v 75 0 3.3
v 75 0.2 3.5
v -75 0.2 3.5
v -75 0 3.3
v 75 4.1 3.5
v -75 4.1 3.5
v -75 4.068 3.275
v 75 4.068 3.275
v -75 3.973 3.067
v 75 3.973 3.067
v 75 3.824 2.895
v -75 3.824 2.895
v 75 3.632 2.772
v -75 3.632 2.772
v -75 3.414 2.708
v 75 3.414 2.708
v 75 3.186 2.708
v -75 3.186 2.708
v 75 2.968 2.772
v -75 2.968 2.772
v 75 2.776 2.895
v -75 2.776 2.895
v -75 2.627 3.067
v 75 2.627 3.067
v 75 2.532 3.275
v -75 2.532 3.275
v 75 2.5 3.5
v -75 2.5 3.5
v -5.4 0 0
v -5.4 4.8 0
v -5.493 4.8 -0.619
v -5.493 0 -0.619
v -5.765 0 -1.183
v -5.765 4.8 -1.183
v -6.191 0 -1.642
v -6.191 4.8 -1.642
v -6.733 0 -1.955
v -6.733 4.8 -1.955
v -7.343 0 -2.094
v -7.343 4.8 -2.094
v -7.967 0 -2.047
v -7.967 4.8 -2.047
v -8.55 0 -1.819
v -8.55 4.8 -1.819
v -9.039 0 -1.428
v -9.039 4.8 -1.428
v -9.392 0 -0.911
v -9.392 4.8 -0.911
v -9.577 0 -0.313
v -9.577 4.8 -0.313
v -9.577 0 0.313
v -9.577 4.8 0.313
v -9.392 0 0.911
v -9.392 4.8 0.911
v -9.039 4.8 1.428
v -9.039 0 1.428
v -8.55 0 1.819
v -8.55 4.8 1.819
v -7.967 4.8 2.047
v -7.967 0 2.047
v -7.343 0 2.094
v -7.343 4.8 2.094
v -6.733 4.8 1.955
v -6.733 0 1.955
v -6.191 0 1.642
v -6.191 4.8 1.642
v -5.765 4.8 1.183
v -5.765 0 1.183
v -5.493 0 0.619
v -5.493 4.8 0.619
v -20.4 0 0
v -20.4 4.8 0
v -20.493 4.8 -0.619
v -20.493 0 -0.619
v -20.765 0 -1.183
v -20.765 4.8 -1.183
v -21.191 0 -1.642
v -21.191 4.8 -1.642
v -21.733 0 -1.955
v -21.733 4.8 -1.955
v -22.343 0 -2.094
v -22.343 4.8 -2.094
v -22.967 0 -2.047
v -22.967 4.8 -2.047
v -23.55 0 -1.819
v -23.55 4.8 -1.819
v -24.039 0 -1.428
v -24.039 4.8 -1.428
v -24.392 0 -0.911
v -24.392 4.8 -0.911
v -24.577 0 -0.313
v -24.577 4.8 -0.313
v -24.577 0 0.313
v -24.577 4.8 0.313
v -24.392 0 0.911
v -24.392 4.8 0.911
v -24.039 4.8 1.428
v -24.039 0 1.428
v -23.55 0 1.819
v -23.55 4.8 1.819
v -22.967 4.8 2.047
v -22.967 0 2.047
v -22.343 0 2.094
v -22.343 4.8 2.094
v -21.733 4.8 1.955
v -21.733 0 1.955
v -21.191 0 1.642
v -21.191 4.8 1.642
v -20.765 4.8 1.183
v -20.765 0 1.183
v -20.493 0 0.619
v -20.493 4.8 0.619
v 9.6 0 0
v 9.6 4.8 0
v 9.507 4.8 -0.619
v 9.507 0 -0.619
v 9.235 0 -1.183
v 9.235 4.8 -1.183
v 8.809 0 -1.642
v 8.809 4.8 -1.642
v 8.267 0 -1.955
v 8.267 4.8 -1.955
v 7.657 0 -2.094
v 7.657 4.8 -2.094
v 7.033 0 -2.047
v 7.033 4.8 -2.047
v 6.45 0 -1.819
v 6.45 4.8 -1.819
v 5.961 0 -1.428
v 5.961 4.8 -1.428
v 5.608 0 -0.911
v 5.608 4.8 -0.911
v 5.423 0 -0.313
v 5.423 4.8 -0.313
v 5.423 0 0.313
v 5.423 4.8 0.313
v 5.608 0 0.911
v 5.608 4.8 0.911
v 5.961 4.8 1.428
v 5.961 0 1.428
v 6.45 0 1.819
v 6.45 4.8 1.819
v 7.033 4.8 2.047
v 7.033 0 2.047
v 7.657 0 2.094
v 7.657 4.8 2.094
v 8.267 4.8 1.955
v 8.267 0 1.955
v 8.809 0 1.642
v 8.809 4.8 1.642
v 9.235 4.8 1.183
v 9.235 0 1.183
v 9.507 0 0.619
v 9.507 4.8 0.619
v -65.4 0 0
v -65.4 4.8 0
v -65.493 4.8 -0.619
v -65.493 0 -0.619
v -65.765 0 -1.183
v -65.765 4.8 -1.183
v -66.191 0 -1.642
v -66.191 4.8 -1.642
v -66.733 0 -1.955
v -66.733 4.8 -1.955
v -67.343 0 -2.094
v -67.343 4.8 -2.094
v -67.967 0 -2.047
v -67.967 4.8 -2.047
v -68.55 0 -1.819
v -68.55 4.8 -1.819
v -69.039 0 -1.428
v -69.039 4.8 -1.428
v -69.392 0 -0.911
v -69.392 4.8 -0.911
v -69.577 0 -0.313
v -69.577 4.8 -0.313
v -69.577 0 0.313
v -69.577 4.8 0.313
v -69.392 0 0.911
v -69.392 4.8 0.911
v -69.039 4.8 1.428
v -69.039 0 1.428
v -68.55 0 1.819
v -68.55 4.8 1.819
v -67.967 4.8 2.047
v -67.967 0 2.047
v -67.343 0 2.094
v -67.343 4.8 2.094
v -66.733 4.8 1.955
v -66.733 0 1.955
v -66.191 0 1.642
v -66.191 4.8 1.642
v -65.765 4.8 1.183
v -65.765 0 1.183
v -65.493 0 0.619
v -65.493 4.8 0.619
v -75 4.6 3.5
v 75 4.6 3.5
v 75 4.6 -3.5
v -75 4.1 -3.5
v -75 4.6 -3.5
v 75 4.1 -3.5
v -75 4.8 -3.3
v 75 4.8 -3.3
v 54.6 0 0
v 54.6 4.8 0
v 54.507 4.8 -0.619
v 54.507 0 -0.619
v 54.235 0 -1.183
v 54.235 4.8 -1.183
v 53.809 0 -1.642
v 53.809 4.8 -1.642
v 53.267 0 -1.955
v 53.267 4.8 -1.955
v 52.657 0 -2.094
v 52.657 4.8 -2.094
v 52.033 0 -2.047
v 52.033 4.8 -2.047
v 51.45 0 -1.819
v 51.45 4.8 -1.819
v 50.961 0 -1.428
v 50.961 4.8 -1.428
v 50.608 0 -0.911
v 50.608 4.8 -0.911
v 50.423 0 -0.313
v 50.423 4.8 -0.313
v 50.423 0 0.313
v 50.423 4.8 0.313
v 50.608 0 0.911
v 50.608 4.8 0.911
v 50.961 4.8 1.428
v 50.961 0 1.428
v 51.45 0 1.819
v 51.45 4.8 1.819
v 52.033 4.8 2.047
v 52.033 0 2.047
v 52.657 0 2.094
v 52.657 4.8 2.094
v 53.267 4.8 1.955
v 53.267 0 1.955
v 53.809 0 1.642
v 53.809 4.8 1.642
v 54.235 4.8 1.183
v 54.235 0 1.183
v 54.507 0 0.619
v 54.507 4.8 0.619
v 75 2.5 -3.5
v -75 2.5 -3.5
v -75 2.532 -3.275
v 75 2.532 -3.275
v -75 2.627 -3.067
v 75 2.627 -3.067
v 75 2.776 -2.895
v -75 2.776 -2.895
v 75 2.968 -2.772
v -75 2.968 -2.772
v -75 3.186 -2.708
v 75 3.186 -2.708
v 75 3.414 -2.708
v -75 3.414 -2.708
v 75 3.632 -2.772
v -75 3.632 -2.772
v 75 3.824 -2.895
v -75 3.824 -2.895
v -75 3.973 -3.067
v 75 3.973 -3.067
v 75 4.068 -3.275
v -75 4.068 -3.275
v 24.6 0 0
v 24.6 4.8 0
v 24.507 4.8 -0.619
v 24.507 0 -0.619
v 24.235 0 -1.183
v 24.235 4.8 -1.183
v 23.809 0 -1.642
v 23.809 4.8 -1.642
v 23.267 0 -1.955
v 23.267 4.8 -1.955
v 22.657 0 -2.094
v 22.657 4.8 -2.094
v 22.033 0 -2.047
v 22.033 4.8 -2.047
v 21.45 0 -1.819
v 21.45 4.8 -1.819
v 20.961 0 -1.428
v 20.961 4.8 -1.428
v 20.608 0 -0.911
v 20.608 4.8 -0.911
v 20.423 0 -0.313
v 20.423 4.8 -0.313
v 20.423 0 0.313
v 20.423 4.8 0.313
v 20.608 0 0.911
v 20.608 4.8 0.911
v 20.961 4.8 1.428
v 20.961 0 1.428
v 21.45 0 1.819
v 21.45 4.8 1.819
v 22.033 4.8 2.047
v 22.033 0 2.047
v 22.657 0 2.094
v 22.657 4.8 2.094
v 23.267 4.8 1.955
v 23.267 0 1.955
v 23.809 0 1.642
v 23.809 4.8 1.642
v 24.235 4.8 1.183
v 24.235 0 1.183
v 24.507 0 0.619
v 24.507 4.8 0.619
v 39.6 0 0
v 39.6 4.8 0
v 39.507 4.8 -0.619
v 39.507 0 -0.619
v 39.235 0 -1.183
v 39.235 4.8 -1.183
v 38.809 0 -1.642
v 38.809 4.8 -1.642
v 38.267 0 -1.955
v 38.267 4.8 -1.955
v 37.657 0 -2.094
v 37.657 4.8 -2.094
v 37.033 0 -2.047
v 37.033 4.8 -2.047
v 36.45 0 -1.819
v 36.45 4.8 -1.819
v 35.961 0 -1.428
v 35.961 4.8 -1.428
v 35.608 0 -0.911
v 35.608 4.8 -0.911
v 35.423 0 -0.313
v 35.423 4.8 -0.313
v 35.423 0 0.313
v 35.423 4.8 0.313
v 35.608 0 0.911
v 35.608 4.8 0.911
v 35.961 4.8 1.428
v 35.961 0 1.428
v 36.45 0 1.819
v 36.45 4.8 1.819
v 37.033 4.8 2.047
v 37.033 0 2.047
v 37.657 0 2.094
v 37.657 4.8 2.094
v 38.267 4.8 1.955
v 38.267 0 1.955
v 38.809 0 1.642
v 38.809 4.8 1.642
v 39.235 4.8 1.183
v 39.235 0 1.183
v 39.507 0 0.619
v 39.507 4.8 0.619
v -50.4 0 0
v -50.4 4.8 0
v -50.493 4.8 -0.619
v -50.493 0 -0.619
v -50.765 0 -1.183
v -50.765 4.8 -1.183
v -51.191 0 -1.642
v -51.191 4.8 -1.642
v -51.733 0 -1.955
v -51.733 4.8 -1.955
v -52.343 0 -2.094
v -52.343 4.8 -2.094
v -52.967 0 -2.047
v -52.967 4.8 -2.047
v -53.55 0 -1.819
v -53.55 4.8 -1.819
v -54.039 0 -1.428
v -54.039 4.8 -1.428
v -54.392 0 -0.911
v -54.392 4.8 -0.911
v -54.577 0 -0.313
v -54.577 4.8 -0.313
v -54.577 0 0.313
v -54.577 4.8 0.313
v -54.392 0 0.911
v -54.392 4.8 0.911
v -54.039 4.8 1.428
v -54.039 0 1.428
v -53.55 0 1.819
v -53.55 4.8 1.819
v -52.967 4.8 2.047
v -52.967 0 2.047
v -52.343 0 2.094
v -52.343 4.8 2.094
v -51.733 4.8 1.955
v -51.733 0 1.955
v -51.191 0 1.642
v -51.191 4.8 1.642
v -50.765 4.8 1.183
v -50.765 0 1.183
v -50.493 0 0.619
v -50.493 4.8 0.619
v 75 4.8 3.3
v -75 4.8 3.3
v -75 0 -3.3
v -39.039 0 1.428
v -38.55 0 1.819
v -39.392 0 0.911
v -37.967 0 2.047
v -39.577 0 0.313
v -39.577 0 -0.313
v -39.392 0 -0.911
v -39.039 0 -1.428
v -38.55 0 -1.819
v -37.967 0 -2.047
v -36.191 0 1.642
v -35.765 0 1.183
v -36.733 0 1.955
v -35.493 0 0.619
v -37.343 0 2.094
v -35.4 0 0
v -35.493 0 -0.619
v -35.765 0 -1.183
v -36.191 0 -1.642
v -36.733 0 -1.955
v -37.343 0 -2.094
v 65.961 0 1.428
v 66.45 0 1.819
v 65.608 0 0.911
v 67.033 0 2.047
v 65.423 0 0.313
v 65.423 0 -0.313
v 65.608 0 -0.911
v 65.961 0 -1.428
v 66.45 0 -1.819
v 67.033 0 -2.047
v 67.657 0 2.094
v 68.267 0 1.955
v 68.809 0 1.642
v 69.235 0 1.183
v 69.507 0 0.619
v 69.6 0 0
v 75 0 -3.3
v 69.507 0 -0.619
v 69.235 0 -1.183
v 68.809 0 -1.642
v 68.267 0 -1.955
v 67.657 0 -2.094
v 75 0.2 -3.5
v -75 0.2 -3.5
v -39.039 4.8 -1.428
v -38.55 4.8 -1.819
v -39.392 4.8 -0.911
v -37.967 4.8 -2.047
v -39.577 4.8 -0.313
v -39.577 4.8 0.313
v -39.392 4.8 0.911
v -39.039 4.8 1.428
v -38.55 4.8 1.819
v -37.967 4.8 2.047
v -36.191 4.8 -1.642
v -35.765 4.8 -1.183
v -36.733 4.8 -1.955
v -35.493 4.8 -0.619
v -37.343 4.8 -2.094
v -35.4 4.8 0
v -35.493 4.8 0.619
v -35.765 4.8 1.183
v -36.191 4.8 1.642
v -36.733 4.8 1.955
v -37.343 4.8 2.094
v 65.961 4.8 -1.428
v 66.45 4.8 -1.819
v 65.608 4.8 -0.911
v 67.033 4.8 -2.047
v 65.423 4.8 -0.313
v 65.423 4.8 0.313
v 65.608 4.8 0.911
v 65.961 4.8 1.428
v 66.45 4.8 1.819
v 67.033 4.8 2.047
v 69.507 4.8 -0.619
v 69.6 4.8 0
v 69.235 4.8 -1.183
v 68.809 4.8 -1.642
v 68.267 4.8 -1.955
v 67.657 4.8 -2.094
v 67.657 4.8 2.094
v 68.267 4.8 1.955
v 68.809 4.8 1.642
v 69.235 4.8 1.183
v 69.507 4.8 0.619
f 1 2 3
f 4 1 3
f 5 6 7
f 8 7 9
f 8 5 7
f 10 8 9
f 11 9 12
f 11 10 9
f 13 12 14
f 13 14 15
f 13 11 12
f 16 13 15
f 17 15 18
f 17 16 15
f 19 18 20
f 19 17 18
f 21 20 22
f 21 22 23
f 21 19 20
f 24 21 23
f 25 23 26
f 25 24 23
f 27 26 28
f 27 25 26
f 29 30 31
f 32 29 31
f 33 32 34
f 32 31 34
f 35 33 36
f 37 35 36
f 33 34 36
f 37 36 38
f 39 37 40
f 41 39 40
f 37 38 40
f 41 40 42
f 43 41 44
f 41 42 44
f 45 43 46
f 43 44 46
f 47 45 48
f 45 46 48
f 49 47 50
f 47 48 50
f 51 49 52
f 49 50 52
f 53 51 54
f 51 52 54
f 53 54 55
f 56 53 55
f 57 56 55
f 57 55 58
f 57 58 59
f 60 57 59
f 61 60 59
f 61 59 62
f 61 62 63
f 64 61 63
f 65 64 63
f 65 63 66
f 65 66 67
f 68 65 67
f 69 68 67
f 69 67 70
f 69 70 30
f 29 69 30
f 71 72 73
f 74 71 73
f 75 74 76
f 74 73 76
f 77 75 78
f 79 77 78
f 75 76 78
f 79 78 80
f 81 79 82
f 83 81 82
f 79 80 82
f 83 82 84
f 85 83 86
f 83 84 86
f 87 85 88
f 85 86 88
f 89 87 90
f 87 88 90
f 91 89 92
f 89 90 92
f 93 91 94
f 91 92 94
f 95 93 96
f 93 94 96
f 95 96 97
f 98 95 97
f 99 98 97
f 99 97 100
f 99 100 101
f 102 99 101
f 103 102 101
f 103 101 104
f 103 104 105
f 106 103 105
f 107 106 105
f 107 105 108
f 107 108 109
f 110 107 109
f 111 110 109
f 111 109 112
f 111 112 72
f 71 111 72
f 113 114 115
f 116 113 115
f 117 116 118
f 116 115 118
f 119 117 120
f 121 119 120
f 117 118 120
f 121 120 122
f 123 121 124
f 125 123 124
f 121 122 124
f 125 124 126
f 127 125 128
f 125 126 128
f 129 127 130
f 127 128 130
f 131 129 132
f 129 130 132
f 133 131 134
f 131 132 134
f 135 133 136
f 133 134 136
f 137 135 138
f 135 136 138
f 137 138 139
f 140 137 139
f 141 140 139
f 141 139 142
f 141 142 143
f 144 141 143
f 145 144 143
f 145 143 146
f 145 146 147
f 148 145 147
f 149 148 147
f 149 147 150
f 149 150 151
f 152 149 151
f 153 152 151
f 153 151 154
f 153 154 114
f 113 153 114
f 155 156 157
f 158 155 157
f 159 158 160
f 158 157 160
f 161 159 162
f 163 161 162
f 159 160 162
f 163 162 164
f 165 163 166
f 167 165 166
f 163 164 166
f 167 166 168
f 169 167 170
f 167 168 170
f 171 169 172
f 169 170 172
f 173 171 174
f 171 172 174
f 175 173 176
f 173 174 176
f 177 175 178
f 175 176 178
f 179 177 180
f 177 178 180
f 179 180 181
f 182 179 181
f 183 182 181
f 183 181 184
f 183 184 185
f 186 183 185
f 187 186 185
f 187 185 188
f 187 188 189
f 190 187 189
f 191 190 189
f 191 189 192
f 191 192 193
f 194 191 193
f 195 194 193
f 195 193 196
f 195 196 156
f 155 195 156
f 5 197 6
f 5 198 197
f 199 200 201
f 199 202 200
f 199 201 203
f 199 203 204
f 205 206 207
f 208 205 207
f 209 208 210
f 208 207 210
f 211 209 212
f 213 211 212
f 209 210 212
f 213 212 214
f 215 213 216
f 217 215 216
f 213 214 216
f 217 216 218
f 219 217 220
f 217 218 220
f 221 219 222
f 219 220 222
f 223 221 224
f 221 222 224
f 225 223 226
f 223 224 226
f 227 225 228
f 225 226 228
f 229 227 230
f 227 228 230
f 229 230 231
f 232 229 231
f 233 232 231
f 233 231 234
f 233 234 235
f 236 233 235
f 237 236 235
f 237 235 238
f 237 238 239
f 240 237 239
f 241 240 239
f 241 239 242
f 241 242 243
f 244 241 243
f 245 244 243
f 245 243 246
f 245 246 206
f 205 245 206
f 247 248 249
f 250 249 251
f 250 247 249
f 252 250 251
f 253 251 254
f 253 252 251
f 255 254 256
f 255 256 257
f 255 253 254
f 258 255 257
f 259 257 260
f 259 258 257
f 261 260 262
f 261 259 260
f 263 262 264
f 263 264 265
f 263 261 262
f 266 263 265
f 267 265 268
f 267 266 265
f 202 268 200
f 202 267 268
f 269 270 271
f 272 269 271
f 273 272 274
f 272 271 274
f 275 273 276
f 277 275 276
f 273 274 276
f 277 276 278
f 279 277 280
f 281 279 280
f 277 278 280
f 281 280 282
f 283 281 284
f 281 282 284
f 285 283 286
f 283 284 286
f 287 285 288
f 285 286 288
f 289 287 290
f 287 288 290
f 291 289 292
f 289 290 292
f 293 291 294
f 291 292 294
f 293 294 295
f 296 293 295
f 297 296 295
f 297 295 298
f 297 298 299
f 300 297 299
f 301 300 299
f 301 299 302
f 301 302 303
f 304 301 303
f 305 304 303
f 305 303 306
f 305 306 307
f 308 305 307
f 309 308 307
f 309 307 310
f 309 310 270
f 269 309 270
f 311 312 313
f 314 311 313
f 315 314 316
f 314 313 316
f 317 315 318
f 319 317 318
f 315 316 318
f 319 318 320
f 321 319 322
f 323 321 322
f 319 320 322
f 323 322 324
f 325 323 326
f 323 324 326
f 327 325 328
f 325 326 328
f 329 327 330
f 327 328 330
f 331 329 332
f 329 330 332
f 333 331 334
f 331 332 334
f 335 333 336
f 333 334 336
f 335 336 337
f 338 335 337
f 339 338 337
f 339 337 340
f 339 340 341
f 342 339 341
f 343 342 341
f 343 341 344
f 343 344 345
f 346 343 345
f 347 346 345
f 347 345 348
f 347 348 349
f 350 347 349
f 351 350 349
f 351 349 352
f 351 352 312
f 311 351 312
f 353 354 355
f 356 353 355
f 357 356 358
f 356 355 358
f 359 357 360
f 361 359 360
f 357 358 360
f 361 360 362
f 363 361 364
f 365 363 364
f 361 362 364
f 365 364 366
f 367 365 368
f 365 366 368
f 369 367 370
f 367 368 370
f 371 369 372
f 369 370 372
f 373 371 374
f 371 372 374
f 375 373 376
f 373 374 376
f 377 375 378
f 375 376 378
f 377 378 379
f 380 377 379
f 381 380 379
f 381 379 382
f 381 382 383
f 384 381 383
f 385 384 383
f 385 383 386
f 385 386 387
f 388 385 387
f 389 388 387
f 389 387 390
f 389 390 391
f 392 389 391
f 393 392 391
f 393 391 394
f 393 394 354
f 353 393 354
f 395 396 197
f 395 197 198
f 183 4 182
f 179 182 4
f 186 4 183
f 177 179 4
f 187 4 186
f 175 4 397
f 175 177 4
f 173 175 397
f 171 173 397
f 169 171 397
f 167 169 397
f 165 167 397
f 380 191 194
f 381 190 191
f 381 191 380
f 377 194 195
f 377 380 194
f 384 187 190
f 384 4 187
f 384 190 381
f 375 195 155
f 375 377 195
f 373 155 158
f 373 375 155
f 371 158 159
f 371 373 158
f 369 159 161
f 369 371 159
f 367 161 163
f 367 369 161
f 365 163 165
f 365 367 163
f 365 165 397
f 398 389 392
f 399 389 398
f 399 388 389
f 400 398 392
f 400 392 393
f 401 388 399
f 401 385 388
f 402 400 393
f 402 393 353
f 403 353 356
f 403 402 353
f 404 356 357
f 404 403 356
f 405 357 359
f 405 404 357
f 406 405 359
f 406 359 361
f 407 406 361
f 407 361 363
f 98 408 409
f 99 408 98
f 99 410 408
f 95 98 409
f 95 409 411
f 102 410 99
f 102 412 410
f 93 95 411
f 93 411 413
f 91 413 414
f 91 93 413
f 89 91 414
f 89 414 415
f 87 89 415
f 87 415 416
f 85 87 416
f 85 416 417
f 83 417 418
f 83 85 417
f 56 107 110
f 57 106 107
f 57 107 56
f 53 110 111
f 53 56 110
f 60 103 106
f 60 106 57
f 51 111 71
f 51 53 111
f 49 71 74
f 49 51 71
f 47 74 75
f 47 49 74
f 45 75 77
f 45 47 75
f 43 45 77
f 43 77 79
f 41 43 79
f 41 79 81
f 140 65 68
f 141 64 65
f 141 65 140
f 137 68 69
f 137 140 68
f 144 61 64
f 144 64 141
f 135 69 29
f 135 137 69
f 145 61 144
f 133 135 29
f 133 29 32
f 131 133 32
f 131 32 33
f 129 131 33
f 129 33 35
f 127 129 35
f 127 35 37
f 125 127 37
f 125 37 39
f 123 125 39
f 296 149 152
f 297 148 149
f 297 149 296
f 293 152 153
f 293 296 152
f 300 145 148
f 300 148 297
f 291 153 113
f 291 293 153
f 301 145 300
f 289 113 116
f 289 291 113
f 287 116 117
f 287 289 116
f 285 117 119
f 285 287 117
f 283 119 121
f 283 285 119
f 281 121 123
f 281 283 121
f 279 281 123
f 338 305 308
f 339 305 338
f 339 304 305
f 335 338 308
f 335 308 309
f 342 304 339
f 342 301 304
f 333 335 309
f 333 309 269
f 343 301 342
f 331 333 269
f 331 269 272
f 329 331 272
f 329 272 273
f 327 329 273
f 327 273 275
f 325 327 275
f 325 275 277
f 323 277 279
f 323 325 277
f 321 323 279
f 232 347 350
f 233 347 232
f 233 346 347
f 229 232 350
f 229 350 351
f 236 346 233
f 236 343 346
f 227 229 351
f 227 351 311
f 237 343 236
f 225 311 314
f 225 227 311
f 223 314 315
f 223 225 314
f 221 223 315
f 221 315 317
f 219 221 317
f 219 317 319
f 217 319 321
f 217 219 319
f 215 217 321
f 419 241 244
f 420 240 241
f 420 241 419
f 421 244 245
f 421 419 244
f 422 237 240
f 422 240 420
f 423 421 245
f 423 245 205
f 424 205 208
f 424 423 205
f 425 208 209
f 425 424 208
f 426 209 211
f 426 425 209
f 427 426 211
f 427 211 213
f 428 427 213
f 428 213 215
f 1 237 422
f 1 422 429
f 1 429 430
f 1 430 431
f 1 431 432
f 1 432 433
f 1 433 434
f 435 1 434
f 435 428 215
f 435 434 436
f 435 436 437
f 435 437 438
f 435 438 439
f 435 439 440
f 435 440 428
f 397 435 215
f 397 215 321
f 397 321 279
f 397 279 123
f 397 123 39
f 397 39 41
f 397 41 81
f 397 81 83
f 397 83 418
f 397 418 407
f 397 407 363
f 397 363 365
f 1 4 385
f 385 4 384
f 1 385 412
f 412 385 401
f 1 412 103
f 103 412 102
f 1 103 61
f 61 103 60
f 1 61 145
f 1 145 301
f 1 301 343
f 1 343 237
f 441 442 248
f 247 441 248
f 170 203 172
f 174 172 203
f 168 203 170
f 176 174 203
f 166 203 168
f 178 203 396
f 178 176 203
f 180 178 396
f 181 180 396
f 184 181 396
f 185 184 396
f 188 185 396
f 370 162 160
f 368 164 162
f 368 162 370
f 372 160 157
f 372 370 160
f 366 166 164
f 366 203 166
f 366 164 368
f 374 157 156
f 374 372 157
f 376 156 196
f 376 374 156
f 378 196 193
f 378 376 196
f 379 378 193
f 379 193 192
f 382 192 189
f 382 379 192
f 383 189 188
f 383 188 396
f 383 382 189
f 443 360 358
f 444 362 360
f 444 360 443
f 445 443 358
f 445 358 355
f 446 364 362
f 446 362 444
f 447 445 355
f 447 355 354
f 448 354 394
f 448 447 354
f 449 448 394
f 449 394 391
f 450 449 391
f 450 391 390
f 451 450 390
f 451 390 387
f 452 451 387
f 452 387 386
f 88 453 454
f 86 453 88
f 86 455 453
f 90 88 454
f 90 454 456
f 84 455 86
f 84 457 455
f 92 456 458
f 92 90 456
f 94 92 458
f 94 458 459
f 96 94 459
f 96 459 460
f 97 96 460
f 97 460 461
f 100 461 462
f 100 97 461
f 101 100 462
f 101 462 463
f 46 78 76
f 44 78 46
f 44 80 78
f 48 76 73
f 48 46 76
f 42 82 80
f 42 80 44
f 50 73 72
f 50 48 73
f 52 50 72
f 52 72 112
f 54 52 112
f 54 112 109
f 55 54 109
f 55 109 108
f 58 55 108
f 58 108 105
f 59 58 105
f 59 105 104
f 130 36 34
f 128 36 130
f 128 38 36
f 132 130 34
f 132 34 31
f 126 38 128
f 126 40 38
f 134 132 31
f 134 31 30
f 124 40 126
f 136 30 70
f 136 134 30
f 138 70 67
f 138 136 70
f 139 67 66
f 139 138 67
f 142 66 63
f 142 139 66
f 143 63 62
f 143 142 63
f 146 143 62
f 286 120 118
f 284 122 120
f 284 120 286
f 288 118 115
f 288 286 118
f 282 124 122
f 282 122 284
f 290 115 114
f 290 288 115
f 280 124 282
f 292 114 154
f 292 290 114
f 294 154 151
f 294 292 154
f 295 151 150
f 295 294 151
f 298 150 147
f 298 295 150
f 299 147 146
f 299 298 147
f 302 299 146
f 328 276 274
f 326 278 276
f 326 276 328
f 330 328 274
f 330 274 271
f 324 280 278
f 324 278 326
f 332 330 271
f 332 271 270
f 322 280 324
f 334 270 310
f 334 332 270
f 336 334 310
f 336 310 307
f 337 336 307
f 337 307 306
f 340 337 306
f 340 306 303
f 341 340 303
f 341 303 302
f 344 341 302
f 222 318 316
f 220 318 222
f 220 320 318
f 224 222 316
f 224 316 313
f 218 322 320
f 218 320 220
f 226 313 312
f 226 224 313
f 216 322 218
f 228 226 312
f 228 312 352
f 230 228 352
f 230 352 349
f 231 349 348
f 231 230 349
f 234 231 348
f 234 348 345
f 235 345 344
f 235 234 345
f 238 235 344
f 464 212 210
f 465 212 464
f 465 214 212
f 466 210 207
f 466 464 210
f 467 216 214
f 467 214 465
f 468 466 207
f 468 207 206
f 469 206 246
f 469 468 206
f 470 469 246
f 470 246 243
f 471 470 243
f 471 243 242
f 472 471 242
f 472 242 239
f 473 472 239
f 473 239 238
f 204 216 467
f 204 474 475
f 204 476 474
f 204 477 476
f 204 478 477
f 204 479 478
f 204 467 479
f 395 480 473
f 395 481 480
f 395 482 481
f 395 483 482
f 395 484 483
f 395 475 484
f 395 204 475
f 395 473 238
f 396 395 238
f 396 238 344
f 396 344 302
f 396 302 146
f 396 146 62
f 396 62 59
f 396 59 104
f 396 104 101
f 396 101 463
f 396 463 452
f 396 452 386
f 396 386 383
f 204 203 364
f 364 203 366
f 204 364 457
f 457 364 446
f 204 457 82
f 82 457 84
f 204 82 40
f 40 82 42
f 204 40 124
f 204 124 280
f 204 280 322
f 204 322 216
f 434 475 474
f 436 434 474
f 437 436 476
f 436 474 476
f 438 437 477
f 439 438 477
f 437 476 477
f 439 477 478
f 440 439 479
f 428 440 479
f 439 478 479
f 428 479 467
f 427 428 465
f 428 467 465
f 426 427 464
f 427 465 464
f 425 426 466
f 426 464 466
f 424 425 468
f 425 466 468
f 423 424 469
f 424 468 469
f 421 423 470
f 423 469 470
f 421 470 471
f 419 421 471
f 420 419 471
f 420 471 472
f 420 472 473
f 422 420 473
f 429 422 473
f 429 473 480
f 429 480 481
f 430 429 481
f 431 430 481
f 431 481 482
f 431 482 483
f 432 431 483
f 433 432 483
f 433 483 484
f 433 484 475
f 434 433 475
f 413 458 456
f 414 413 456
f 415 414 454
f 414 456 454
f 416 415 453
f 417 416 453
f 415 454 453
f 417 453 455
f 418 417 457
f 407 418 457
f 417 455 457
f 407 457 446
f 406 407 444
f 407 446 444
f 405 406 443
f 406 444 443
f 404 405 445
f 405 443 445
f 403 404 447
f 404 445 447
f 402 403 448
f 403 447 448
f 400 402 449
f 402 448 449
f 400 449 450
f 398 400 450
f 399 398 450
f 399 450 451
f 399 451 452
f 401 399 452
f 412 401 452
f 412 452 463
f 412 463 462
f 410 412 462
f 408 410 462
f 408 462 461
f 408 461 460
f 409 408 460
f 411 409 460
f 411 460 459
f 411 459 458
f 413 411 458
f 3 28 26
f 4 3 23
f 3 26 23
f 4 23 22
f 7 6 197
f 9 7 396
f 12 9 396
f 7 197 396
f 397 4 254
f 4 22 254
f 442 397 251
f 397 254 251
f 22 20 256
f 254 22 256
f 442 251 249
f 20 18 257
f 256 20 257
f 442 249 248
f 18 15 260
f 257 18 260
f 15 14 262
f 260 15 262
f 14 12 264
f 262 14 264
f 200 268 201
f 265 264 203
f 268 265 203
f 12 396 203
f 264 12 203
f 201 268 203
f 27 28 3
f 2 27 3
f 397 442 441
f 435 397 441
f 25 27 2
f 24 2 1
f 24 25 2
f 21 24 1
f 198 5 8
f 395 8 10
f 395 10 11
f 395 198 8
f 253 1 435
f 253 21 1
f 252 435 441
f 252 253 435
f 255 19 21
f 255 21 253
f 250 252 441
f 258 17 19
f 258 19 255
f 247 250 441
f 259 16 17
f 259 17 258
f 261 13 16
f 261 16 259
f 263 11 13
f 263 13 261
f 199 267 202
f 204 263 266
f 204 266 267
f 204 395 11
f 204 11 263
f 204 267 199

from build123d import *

# Parameters (mm, degrees)
RESSALTO_EXTRUS_O1_DEPTH = 75
CHANFRO1_SIZE            = 0.2
ESBO_O2_R                = 2.1
CORTE_EXTRUS_O1_DEPTH    = 150


with BuildPart() as part:
    # Esboço1 → Ressalto-extrusão1 (new body, symmetric)
    with BuildSketch(Plane(origin=(0, 0, 0), x_dir=(0, 0, -1), z_dir=(1, 0, 0))):
        with BuildLine():
            Line((-3.5, 0), (3.5, 0))
            Line((3.5, 0), (3.5, 2.5))
            ThreePointArc((3.5, 2.5), (2.7, 3.3), (3.5, 4.1))
            Line((3.5, 4.1), (3.5, 4.8))
            Line((3.5, 4.8), (-3.5, 4.8))
            Line((-3.5, 4.8), (-3.5, 4.1))
            ThreePointArc((-3.5, 4.1), (-2.7, 3.3), (-3.5, 2.5))
            Line((-3.5, 2.5), (-3.5, 0))
        make_face()
    extrude(amount=RESSALTO_EXTRUS_O1_DEPTH, both=True)

    # Chanfro1
    chanfro1_edges = [part.edges().sort_by_distance(p)[0] for p in [
        (0, 0, -3.5),
        (0, 0, 3.5),
        (0, 4.8, 3.5),
        (0, 4.8, -3.5),
    ]]
    chamfer(chanfro1_edges, length=CHANFRO1_SIZE)

    # Esboço2 → Corte-extrusão1 (cut)
    with BuildSketch(Plane(origin=(0, 4.8, 0), x_dir=(1, 0, 0), z_dir=(0, 1, 0))):
        with Locations((-7.5, 0)):
            Circle(ESBO_O2_R)
        with Locations((-22.5, 0)):
            Circle(ESBO_O2_R)
        with Locations((-37.5, 0)):
            Circle(ESBO_O2_R)
        with Locations((-52.5, 0)):
            Circle(ESBO_O2_R)
        with Locations((-67.5, 0)):
            Circle(ESBO_O2_R)
        with Locations((67.5, 0)):
            Circle(ESBO_O2_R)
        with Locations((52.5, 0)):
            Circle(ESBO_O2_R)
        with Locations((37.5, 0)):
            Circle(ESBO_O2_R)
        with Locations((22.5, 0)):
            Circle(ESBO_O2_R)
        with Locations((7.5, 0)):
            Circle(ESBO_O2_R)
    extrude(amount=-CORTE_EXTRUS_O1_DEPTH, mode=Mode.SUBTRACT)


solid = part.part
